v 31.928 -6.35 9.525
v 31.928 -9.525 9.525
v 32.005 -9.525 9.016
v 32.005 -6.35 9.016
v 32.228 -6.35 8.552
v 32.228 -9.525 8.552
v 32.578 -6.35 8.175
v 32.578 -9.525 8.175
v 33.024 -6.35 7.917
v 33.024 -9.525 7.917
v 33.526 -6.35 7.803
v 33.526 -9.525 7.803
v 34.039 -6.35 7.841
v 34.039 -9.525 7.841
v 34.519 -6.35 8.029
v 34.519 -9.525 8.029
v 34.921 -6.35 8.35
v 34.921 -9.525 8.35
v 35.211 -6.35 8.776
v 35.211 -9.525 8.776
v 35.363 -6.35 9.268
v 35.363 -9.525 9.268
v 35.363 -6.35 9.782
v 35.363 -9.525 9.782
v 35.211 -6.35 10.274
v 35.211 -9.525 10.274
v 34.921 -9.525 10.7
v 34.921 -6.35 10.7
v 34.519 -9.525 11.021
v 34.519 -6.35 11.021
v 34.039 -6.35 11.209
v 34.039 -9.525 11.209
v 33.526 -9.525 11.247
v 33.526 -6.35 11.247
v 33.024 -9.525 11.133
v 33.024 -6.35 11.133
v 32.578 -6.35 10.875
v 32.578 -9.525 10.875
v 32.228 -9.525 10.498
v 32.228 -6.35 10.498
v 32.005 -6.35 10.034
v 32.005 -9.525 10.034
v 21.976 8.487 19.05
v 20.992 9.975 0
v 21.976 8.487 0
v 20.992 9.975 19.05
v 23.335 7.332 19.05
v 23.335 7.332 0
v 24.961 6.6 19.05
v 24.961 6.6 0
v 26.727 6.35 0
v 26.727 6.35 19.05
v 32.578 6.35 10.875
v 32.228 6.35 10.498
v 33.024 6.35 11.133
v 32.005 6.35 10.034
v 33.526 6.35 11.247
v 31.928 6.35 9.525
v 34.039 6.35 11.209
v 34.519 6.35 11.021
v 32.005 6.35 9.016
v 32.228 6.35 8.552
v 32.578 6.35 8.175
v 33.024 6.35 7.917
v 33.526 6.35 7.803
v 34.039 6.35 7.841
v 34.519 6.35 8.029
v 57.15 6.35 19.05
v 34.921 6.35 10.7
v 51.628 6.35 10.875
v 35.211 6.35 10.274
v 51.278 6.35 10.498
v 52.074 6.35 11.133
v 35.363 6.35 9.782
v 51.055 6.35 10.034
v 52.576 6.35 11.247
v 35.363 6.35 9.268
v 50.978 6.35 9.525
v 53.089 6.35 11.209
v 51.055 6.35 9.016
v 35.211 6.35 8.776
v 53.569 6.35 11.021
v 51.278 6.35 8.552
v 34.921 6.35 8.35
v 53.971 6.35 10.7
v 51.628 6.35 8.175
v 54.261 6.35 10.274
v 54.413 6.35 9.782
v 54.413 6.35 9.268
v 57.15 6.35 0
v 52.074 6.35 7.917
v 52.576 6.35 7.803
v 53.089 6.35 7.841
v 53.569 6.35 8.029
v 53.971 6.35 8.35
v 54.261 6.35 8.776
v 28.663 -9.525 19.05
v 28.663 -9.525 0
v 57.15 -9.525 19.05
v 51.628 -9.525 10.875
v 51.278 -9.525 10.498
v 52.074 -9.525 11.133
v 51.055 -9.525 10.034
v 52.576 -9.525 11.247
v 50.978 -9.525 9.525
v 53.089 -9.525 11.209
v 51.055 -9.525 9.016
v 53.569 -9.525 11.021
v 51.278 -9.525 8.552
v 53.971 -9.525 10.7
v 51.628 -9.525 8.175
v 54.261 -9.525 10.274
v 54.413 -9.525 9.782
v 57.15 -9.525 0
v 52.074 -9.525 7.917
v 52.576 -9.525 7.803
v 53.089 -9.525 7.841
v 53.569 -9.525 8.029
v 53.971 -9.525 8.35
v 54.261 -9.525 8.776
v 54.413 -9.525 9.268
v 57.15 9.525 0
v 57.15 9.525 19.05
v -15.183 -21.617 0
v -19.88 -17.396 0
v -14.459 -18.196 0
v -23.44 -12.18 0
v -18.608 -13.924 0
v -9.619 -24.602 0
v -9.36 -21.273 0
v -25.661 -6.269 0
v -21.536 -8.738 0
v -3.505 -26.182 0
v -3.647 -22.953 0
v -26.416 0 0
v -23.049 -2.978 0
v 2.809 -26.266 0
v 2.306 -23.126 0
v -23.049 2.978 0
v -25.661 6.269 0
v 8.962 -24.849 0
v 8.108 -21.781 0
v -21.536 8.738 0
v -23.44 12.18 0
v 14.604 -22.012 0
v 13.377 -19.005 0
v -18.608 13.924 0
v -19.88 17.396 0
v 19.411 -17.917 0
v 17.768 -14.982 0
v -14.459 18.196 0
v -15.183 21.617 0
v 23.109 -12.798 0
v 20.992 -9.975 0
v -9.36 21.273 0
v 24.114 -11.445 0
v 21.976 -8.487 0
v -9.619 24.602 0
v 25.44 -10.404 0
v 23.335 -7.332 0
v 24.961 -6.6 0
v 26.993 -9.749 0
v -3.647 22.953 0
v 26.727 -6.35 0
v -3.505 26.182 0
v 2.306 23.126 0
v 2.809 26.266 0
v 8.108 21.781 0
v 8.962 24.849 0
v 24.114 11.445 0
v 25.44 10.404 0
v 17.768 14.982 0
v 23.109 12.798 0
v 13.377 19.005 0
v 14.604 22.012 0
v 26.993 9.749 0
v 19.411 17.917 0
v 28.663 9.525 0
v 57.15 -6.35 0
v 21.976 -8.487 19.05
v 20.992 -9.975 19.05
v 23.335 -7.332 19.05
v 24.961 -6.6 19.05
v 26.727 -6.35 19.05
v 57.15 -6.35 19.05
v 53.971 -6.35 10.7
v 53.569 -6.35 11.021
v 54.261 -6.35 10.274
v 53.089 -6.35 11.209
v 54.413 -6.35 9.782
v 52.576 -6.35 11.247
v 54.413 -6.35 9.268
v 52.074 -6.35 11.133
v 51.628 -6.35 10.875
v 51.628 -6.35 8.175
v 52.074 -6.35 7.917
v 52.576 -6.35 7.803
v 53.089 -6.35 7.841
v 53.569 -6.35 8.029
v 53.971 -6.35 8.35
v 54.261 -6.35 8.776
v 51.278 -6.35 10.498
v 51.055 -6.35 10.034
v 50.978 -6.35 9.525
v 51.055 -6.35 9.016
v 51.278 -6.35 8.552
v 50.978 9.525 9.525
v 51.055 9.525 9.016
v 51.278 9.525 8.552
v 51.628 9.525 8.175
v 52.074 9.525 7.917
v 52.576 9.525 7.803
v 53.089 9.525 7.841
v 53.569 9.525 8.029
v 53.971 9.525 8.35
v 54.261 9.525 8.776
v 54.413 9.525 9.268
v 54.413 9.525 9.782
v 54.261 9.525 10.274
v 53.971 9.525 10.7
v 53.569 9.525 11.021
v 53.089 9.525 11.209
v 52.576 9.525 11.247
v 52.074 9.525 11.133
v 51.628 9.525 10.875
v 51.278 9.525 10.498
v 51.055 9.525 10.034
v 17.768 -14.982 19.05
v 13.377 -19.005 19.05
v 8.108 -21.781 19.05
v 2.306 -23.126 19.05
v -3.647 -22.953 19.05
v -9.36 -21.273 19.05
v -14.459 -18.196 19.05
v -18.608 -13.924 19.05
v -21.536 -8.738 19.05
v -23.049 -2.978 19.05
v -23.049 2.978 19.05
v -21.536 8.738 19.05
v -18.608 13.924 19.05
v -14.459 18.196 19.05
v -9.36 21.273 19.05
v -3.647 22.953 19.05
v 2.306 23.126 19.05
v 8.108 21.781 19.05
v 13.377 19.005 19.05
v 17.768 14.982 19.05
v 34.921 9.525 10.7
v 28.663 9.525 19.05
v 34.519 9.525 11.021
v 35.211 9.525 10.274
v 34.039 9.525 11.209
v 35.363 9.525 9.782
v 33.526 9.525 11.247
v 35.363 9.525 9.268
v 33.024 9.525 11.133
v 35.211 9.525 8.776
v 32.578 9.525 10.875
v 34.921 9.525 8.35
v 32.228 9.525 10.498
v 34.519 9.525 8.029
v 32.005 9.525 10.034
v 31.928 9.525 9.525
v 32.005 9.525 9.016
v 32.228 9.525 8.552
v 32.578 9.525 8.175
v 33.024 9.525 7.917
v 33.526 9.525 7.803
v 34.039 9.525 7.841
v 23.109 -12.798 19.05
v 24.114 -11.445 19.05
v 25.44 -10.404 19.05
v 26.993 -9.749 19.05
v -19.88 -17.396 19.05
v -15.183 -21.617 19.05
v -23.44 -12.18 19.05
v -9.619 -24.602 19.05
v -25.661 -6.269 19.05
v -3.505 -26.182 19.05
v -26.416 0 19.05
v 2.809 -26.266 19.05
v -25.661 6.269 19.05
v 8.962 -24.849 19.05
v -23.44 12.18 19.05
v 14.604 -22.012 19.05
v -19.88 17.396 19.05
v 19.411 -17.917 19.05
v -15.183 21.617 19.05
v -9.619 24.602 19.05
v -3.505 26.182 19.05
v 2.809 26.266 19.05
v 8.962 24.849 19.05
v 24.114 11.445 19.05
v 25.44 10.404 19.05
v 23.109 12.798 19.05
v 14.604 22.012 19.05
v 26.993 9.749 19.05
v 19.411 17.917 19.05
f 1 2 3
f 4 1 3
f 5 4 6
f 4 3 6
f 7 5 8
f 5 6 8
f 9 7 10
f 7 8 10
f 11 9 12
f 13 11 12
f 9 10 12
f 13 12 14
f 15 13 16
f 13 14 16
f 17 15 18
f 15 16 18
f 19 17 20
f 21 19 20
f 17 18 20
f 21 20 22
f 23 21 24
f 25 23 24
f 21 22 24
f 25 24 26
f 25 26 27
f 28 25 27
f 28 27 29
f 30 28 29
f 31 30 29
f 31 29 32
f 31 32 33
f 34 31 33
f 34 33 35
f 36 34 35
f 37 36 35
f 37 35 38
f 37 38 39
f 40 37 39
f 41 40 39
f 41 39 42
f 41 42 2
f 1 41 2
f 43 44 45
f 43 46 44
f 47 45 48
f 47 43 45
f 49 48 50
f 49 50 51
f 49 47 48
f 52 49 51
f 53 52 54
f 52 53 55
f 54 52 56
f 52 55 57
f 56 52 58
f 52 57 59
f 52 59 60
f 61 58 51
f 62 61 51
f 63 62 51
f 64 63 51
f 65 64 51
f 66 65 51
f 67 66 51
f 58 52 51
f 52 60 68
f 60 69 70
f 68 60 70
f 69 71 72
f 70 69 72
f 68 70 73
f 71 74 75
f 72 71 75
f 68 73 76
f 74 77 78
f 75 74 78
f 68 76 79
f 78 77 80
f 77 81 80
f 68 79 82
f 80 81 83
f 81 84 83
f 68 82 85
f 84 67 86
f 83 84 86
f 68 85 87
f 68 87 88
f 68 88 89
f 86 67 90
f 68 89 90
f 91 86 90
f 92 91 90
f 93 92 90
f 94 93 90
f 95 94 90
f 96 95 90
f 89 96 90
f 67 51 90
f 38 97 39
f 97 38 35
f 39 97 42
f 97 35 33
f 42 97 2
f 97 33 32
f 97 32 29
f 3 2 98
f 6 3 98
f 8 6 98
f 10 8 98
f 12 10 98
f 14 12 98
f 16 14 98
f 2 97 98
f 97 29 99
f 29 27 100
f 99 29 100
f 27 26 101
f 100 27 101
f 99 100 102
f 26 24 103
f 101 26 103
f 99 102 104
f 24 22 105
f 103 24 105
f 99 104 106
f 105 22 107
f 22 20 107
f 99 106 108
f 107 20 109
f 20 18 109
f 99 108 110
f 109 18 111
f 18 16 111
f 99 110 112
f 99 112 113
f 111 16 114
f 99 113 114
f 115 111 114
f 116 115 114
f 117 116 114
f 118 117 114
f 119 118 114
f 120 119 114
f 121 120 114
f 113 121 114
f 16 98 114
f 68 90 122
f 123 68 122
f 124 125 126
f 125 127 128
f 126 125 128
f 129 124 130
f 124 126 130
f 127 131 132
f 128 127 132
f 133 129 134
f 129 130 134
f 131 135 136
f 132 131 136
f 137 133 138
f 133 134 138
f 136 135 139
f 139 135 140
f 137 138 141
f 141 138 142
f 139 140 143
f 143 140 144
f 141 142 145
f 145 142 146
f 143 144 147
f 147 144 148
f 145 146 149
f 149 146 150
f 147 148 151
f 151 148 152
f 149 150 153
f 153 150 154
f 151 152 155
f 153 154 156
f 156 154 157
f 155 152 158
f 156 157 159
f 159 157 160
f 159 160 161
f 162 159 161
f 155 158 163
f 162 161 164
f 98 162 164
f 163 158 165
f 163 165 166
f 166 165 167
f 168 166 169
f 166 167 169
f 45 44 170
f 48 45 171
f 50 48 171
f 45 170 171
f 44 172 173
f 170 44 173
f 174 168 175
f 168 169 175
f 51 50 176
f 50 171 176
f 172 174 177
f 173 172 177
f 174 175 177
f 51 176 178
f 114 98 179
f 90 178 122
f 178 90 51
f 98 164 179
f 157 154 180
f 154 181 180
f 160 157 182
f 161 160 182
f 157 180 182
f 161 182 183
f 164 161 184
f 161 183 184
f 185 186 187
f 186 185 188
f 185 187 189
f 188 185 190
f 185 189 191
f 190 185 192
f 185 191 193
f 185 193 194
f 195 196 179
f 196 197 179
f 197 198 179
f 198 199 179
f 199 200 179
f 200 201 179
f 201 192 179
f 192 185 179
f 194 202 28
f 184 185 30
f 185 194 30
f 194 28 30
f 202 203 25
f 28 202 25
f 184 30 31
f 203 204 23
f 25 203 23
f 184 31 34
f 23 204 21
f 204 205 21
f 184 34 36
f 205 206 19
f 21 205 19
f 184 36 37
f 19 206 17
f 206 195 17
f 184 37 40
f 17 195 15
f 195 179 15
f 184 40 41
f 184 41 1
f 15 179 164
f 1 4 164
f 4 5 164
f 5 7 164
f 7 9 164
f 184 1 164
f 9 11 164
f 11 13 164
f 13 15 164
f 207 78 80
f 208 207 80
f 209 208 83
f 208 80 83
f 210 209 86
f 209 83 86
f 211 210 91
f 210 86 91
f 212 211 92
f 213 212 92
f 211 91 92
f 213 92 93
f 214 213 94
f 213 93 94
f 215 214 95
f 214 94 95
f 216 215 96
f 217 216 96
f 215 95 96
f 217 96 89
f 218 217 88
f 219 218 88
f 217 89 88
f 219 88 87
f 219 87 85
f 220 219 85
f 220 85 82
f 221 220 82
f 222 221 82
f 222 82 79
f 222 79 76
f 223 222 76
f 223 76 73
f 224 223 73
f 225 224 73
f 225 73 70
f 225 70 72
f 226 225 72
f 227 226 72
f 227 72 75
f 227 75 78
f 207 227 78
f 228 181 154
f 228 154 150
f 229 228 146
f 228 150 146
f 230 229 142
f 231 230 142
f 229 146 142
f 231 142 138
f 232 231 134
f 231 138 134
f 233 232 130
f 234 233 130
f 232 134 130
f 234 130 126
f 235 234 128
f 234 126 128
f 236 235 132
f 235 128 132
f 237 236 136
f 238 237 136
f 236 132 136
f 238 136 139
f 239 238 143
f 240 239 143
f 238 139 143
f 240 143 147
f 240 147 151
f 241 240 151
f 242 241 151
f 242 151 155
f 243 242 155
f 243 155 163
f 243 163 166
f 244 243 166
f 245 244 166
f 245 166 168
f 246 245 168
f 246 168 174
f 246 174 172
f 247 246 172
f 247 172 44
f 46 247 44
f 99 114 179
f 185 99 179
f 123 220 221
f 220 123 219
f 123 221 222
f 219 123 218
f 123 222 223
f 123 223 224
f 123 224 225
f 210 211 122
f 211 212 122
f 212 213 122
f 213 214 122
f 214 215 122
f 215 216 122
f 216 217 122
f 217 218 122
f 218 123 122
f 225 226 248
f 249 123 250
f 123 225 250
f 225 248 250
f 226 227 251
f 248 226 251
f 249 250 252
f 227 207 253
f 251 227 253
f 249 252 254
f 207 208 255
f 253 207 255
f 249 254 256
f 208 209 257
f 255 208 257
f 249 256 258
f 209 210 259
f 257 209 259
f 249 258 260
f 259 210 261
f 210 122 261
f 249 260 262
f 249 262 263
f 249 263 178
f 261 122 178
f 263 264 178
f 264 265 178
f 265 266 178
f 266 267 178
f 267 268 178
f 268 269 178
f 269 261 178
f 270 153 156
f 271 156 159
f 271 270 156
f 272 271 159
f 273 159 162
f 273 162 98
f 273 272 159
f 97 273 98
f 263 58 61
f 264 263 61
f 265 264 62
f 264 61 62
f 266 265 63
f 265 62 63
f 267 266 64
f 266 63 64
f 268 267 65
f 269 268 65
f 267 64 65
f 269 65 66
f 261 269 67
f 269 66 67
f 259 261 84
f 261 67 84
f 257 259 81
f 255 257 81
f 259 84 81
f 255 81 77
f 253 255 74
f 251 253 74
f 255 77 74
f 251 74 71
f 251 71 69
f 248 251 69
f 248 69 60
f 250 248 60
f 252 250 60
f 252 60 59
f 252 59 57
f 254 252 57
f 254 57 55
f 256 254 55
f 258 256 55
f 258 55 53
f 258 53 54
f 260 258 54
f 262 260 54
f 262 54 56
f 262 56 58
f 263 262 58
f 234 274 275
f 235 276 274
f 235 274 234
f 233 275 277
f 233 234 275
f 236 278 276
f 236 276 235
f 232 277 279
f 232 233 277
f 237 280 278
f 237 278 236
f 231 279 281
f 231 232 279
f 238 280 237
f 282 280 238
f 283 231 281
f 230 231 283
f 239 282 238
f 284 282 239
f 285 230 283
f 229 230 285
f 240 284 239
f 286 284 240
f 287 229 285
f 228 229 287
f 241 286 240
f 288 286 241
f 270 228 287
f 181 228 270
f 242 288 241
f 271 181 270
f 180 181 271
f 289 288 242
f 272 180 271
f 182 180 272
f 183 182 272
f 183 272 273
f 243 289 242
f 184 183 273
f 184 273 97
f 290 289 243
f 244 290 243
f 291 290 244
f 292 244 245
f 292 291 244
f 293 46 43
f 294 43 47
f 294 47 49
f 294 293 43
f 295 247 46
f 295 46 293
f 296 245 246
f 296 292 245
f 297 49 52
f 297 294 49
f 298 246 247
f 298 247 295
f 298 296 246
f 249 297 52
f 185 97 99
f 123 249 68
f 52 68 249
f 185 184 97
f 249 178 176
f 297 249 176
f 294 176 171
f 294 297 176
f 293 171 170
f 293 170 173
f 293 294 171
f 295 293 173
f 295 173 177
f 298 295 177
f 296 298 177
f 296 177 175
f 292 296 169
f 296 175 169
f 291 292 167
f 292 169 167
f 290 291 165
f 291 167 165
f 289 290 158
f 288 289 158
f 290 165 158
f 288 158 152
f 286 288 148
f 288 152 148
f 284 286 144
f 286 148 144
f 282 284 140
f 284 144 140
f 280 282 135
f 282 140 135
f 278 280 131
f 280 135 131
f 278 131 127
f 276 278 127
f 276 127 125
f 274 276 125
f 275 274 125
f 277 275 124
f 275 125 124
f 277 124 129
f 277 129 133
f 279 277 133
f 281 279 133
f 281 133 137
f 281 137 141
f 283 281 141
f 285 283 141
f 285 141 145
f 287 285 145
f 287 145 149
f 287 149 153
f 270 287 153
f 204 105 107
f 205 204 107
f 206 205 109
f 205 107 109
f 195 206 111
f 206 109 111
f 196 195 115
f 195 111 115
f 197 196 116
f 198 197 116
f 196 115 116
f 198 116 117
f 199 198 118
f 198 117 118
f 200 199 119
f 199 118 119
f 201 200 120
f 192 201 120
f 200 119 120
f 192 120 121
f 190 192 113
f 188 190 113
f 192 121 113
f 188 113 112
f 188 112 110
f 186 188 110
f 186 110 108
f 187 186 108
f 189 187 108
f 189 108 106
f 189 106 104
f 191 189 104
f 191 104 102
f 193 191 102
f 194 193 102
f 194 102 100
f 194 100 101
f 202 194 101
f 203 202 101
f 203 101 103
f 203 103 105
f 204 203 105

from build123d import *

# Parameters (mm, degrees)
BOSS_EXTRUDE1_DEPTH         = 19.05
FILLET1_R                   = 6.35
F_29_0_136_DIAMETER_HOLE1_D = 3.4544


with BuildPart() as part:
    # Sketch1 → Boss-Extrude1 (new body)
    with BuildSketch(Plane.XY):
        with BuildLine():
            ThreePointArc((22.356689849, -6.35), (-23.241, 0), (22.356689849, 6.35))
            Line((22.356689849, 6.35), (57.15, 6.35))
            Line((57.15, 6.35), (57.15, 9.525))
            Line((57.15, 9.525), (24.638981939, 9.525))
            ThreePointArc((24.638981939, 9.525), (-26.416, 0), (24.638981939, -9.525))
            Line((24.638981939, -9.525), (57.15, -9.525))
            Line((57.15, -9.525), (57.15, -6.35))
            Line((57.15, -6.35), (22.356689849, -6.35))
        make_face()
    extrude(amount=BOSS_EXTRUDE1_DEPTH)

    # Fillet1
    fillet1_edges = [part.edges().sort_by_distance(p)[0] for p in [
        (22.356689849, 6.35, 9.525),
        (22.356689849, -6.35, 9.525),
        (24.638981939, -9.525, 9.525),
        (24.638981939, 9.525, 9.525),
    ]]
    fillet(fillet1_edges, radius=FILLET1_R)

    # #29 (0.136) Diameter Hole1 (through all)
    with Locations(Plane(origin=(0, 9.525, 0), x_dir=(1, 0, 0), z_dir=(0, 1, 0))):
        with Locations((33.655, -9.525), (52.705, -9.525)):
            Hole(F_29_0_136_DIAMETER_HOLE1_D / 2)


solid = part.part
